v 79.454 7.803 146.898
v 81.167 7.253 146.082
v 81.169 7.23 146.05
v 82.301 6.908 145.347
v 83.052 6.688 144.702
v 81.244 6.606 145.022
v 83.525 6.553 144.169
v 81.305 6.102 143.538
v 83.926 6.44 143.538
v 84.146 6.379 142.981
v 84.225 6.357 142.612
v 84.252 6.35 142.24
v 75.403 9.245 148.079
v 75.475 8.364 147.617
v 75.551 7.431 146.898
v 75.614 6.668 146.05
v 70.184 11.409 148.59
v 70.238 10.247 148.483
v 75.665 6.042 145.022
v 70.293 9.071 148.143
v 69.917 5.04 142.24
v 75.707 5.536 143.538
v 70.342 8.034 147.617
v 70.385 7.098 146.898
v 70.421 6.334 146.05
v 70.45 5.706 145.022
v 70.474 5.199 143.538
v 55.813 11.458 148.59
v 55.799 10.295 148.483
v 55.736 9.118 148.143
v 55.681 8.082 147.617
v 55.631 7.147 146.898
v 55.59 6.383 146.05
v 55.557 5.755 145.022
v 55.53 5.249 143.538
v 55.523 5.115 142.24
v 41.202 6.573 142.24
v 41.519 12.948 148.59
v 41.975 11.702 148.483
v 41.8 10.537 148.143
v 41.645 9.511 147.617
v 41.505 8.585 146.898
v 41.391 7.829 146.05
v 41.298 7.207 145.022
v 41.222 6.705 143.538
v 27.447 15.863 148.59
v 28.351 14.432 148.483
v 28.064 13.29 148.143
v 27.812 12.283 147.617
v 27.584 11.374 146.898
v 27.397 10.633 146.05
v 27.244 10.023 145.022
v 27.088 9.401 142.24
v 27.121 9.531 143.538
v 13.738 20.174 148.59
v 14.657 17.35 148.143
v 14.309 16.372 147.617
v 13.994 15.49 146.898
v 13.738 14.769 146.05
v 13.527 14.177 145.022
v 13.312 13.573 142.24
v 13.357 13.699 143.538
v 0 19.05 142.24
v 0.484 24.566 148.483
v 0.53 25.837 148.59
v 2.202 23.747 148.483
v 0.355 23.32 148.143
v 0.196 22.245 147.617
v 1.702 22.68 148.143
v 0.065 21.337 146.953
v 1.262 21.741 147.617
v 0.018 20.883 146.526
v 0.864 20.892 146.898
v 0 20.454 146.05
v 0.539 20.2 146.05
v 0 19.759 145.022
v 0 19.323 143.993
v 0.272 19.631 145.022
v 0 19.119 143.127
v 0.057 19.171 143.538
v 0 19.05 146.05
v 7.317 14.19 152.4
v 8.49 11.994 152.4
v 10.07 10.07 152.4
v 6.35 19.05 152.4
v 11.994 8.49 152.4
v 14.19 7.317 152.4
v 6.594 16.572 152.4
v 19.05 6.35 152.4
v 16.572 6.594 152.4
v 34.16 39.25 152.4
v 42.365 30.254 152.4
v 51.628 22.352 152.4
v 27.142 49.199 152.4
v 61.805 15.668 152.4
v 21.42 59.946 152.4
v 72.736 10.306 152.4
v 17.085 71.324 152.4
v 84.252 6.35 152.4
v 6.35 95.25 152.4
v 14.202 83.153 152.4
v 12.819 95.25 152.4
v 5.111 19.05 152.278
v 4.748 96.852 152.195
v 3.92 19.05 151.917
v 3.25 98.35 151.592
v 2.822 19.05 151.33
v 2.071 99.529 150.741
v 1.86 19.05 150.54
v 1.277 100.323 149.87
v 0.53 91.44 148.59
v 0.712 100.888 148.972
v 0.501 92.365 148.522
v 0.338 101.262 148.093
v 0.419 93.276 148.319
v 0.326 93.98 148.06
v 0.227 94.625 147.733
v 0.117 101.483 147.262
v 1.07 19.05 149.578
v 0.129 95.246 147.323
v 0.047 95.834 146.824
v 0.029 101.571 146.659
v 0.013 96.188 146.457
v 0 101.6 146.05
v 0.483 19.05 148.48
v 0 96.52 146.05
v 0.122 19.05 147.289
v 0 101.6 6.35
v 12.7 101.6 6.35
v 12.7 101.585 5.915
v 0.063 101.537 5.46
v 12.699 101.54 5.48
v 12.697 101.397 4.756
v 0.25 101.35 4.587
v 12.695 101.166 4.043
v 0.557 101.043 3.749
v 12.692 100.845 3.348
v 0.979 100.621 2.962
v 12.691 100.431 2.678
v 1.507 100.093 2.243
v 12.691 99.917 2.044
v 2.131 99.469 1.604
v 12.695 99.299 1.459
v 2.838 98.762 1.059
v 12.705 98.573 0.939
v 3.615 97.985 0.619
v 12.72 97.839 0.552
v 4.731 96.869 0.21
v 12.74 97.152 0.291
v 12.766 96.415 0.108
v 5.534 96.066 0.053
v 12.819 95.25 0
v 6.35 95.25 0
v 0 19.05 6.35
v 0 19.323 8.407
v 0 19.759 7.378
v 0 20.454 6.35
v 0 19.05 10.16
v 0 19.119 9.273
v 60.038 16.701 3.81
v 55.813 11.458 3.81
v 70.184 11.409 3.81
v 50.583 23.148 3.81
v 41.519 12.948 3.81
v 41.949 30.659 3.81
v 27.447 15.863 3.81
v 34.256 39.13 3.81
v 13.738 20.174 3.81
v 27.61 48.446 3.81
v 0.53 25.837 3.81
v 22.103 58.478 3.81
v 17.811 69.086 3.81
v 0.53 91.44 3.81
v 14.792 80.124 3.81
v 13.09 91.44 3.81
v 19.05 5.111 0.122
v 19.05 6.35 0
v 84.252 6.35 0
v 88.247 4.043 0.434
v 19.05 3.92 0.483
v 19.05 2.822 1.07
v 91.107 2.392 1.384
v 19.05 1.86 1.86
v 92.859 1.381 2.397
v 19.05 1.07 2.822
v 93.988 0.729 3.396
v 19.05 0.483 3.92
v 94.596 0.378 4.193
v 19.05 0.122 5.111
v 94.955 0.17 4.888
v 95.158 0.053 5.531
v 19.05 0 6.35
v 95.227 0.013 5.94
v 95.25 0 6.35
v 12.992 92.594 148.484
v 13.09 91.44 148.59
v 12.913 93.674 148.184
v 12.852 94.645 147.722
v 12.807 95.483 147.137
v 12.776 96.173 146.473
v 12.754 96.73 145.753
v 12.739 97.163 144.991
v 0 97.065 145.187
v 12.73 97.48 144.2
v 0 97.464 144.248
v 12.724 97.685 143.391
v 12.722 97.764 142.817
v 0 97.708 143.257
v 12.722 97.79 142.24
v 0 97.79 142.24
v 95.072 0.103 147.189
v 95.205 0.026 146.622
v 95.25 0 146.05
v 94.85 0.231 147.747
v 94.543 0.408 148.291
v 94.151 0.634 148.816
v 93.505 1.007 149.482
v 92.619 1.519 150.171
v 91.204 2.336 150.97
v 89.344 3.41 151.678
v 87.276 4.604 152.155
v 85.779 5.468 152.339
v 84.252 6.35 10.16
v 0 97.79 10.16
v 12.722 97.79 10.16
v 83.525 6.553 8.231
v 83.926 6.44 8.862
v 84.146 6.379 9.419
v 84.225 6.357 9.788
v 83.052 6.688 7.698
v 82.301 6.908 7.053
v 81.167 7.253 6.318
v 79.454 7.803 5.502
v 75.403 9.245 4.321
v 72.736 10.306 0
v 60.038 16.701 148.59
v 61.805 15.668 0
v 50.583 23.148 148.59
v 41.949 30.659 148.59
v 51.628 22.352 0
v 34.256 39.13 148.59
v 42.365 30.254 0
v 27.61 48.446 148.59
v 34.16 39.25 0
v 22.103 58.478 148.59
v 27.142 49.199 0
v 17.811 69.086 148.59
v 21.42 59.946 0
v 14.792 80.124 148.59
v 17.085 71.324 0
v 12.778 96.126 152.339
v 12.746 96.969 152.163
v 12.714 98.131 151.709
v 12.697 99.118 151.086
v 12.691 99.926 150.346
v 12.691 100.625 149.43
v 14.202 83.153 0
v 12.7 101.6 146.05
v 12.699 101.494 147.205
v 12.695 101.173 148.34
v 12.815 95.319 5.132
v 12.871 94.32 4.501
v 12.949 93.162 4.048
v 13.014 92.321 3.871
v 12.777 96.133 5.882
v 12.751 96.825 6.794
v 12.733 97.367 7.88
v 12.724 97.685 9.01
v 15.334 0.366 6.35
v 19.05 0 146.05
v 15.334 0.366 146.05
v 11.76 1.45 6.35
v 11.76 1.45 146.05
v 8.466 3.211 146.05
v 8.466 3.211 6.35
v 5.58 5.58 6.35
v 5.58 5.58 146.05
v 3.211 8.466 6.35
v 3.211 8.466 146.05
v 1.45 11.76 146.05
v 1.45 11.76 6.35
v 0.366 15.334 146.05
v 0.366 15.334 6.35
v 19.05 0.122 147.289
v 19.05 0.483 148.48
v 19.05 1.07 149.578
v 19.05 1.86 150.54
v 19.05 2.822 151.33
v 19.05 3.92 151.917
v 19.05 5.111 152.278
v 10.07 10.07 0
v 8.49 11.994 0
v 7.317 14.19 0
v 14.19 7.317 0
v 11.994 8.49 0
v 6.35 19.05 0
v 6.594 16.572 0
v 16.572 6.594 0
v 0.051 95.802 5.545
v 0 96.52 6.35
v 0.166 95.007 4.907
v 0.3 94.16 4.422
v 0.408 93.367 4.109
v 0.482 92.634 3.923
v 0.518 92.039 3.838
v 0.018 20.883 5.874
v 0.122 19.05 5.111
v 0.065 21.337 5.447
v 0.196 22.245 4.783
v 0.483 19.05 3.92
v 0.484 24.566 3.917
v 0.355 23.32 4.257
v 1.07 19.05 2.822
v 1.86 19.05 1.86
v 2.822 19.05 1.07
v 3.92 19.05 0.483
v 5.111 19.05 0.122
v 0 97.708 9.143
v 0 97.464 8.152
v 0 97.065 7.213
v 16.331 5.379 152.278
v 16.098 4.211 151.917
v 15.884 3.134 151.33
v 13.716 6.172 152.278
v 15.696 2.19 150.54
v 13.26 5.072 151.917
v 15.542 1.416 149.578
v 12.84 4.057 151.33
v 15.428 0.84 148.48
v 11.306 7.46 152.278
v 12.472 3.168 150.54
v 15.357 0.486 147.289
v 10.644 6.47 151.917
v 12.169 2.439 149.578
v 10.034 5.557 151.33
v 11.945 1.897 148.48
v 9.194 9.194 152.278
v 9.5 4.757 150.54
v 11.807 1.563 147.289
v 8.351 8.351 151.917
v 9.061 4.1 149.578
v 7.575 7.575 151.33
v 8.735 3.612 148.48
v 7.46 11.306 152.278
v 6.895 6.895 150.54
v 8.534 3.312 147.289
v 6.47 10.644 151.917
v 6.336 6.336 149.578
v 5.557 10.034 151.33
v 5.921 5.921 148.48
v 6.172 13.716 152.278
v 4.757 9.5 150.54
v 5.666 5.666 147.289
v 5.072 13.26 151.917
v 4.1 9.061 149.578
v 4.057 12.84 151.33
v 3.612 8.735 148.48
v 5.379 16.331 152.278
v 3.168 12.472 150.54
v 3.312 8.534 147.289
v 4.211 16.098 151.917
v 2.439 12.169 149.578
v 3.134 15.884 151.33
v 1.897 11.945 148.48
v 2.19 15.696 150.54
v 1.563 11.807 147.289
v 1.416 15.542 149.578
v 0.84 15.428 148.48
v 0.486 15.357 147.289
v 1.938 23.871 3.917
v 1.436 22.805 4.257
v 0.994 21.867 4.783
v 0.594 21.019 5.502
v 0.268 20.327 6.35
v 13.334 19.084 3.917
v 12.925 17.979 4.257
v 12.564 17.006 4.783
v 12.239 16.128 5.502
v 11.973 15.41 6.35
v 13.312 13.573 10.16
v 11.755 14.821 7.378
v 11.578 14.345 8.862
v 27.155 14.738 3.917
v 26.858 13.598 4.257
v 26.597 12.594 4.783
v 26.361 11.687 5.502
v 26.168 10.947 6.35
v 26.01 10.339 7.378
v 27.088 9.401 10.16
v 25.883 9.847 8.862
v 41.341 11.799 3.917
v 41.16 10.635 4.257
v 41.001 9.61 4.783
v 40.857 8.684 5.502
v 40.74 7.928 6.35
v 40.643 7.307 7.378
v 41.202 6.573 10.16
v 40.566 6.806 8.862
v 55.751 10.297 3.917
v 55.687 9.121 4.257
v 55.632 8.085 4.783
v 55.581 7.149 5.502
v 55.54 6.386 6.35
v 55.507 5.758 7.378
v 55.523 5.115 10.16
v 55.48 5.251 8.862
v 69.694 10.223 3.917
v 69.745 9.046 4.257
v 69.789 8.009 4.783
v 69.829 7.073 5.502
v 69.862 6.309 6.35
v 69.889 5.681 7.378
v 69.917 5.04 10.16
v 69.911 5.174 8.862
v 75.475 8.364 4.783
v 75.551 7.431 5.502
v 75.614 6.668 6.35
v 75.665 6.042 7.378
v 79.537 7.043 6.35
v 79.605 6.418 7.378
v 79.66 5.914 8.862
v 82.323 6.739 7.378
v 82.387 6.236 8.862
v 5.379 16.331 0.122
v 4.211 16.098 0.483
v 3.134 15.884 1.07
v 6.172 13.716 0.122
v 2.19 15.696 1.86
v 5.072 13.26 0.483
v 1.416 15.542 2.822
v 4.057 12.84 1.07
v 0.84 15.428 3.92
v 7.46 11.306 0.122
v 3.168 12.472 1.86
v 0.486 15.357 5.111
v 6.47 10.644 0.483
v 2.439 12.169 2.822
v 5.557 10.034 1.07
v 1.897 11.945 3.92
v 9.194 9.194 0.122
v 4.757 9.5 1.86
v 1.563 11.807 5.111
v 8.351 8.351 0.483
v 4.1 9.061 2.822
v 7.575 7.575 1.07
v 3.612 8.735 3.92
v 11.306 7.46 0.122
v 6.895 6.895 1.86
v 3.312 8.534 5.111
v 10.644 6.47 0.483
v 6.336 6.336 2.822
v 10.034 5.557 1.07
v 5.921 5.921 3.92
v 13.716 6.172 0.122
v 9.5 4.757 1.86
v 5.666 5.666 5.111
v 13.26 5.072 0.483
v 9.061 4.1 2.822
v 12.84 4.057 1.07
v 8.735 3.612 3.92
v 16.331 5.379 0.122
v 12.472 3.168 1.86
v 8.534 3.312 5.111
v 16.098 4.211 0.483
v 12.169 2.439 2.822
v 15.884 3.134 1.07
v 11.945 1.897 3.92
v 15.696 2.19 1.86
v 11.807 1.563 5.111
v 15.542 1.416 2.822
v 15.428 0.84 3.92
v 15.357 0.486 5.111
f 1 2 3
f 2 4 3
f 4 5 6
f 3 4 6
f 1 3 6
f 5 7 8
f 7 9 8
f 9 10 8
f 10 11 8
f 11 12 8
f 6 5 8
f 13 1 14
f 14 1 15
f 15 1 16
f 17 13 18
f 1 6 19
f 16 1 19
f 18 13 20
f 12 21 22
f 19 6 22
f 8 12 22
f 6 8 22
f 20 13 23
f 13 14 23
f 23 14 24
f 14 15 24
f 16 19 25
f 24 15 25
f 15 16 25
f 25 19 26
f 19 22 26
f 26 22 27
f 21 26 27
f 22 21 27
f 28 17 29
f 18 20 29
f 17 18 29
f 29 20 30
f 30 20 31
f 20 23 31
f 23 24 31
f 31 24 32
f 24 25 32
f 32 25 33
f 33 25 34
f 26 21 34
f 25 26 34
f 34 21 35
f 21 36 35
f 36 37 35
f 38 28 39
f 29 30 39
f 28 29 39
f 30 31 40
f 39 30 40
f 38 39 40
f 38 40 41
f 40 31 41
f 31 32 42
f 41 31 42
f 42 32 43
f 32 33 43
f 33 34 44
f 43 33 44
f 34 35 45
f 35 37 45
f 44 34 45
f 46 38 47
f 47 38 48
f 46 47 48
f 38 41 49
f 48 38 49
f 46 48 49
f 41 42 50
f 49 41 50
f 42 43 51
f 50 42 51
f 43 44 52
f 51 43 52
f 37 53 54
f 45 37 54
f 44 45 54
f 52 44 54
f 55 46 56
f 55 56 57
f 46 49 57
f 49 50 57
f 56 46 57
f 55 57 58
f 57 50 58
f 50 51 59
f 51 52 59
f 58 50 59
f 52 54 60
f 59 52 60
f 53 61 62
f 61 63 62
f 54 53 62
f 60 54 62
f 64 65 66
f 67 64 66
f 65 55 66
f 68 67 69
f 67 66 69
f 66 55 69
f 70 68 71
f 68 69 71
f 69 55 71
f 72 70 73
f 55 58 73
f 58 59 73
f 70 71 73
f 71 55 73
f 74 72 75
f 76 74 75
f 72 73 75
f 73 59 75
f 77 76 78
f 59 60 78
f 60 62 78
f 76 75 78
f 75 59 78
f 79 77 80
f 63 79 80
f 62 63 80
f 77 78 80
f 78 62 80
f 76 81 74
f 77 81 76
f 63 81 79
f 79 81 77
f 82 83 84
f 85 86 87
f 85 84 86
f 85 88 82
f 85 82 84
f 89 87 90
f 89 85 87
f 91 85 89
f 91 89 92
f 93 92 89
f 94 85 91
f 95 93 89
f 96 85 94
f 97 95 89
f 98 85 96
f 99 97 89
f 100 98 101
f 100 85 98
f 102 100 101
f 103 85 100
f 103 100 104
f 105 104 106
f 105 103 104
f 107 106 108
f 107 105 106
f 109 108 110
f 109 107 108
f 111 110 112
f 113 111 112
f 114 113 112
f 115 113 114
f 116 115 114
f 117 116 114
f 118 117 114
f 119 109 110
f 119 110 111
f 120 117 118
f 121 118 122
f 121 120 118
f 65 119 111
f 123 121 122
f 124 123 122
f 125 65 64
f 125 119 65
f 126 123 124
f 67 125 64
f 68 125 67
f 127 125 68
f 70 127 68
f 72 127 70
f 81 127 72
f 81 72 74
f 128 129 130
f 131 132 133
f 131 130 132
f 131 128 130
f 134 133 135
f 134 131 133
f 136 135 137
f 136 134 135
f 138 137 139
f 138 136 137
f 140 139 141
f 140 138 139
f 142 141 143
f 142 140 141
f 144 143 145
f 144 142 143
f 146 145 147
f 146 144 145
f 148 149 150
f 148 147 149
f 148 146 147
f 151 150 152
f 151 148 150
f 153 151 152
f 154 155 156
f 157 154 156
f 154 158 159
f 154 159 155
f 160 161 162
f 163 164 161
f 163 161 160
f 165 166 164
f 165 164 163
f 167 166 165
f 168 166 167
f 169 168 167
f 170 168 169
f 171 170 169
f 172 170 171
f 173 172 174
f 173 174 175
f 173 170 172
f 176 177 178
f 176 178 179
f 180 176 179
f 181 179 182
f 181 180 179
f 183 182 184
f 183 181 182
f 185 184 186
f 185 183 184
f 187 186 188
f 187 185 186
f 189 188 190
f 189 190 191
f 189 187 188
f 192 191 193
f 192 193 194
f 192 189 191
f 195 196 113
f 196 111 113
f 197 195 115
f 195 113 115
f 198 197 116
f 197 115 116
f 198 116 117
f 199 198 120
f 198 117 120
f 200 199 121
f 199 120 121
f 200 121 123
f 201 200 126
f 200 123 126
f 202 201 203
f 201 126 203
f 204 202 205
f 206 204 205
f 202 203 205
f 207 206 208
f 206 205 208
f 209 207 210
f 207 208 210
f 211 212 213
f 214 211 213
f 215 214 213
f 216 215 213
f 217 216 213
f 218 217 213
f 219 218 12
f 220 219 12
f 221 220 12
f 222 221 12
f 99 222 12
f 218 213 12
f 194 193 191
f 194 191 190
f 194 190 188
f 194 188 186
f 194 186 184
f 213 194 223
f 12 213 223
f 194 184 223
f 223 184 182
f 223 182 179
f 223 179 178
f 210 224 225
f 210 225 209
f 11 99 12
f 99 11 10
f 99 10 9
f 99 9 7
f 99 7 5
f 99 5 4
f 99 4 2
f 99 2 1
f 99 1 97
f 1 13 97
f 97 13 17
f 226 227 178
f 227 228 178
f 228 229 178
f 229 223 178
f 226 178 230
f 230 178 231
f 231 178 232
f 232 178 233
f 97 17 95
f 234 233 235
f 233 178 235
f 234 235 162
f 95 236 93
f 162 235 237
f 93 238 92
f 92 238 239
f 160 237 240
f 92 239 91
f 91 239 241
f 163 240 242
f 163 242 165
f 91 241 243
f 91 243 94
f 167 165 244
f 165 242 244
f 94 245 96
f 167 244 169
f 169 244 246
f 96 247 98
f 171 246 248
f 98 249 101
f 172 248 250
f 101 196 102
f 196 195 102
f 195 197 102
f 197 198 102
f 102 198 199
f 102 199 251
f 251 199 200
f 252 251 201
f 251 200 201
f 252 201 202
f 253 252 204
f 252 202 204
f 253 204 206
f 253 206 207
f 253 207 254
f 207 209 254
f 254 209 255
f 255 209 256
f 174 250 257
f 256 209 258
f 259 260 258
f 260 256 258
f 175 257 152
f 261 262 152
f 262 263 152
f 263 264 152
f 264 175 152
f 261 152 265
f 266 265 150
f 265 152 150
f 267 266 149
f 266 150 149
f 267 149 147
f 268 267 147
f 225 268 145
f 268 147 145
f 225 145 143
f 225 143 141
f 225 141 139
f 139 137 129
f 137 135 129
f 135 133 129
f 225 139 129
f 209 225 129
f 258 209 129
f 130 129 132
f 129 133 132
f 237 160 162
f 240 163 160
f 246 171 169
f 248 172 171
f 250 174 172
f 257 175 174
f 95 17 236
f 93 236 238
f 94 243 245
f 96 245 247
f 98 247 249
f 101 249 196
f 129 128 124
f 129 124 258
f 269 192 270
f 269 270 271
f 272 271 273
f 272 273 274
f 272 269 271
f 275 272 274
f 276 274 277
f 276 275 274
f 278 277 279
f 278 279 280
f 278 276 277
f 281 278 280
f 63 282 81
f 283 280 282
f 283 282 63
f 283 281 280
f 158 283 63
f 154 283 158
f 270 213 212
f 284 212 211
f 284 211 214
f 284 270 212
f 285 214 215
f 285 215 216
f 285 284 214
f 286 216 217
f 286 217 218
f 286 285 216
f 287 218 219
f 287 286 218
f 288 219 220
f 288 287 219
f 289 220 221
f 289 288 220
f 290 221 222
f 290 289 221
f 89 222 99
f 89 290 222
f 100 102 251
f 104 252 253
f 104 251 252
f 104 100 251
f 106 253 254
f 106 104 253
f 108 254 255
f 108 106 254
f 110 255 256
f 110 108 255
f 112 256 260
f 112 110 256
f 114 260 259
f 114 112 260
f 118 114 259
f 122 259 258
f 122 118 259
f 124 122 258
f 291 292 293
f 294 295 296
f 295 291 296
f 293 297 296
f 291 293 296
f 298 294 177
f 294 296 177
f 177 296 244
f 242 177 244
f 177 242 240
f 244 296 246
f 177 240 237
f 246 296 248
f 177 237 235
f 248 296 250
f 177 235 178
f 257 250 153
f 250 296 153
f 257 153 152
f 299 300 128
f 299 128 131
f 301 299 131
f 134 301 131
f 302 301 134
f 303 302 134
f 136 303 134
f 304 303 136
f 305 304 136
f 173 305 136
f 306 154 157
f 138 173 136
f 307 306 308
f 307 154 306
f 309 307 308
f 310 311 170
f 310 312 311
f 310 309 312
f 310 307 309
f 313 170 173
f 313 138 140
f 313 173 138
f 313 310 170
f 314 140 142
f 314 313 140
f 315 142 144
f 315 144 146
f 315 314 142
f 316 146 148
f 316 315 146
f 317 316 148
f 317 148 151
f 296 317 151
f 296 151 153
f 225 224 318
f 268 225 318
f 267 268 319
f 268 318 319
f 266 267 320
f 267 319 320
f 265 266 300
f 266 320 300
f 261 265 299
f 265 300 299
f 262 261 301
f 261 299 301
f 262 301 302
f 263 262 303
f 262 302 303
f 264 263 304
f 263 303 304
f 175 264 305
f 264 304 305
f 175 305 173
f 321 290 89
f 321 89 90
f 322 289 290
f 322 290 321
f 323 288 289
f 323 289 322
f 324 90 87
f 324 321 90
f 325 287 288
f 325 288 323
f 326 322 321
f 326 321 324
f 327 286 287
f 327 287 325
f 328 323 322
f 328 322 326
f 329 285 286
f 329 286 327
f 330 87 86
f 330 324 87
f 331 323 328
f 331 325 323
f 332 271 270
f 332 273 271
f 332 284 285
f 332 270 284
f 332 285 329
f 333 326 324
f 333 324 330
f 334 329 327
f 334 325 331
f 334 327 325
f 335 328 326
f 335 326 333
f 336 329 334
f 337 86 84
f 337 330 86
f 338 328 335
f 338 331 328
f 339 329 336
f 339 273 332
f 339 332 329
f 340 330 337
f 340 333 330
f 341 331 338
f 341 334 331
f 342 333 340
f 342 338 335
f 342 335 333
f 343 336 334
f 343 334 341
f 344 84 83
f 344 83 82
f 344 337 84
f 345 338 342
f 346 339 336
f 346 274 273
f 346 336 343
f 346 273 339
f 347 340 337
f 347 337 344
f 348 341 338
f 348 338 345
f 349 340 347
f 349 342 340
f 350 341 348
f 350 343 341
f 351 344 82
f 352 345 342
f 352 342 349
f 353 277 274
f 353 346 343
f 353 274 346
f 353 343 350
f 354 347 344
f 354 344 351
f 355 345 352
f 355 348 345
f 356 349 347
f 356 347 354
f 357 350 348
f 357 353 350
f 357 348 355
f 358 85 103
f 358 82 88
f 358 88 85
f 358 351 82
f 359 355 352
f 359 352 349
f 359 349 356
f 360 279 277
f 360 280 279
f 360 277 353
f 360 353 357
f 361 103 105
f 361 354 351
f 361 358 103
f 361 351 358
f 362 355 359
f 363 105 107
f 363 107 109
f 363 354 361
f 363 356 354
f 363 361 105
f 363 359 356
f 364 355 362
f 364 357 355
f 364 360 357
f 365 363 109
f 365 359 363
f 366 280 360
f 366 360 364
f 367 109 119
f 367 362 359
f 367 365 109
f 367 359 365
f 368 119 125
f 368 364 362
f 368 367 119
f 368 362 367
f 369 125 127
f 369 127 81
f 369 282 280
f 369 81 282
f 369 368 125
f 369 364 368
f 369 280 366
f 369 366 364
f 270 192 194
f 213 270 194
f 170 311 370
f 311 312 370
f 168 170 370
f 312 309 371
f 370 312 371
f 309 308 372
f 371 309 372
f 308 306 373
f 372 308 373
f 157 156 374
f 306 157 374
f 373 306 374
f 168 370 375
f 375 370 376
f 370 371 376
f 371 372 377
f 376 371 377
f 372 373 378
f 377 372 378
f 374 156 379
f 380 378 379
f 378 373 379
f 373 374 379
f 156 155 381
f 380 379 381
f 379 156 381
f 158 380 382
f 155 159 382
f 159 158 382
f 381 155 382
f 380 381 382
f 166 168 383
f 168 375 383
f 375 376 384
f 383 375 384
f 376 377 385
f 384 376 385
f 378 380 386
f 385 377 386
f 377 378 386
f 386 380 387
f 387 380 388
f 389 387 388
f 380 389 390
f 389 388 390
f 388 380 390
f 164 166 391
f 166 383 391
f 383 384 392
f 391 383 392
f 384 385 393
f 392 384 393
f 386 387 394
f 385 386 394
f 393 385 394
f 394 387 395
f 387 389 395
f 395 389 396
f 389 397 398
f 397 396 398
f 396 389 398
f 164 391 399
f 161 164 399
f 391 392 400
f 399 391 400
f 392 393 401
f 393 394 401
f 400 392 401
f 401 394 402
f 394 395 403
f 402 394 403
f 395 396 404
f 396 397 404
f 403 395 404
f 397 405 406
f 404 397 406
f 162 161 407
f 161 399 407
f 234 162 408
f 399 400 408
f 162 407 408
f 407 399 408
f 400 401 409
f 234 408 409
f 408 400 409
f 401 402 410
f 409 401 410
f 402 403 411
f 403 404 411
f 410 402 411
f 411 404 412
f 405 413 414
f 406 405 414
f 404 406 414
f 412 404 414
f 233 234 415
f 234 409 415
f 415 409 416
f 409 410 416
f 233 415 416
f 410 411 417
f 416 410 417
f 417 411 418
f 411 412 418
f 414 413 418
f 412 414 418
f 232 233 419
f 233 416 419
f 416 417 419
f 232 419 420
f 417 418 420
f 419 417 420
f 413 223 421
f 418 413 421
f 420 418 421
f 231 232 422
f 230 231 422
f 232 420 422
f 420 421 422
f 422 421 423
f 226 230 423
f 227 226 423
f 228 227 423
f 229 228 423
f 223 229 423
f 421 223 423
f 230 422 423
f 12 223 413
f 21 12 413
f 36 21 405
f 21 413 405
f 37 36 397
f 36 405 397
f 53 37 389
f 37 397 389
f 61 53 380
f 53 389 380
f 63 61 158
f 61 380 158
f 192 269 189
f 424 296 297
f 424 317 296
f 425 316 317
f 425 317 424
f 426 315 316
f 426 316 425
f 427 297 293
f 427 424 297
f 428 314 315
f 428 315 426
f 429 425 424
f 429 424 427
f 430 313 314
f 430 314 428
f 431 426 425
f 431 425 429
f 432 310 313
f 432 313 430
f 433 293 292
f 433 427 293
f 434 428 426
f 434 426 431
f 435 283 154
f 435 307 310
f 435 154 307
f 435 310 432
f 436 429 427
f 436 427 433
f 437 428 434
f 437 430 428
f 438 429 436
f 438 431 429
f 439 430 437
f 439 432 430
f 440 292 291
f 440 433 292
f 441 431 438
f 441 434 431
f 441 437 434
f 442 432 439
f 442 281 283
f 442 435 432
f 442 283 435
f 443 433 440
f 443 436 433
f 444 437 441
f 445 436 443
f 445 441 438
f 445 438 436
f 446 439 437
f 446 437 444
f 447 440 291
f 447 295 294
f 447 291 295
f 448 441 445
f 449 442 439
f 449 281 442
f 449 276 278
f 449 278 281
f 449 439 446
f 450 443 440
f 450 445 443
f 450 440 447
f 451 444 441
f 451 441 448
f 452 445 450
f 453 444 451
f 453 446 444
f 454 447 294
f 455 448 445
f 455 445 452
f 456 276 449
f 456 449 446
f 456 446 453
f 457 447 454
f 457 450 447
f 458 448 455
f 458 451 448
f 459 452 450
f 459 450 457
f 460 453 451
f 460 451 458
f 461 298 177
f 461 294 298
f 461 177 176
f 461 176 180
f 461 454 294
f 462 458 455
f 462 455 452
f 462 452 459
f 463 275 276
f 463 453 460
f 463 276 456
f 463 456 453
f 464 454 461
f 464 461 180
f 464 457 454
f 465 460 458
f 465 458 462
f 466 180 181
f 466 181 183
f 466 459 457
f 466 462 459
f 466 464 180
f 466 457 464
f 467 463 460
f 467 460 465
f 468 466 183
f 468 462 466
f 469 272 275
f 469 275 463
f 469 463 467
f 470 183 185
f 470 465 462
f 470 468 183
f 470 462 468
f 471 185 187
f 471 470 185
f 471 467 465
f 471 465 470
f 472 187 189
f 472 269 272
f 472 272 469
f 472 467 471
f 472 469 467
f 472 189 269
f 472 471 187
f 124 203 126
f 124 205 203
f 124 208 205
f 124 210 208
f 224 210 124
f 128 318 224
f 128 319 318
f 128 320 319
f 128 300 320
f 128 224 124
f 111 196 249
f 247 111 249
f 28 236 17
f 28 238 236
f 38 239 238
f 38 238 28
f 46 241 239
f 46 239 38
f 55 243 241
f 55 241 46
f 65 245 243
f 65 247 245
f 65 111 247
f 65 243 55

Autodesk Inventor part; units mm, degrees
ref_plane "YZ Plane" through (0, 0, 0) normal (1, 0, 0) x (0, 1, 0)
ref_plane "XZ Plane" through (0, 0, 0) normal (0, 1, 0) x (-1, 0, 0)
ref_plane "XY Plane" through (0, 0, 0) normal (0, 0, 1) x (1, 0, 0)
sketch "Sketch1" plane through (0, 0, 0) normal (0, 0, 1) x (1, 0, 0)
  line L0 (0, 0) -> (0, 101.6)
  line L1 (0, 0) -> (95.25, 0)
  line L2 (95.25, 0) -> (84.2515, 6.35)
  line L3 (95.25, 0) -> (107.95, 0) construction
  line L4 (0, 101.6) -> (12.7, 101.6)
  arc A0 (12.7, 101.6) -> (84.2515, 6.35) centre (110.0717, 100.2457) ccw
  dimension "d0" = 101.6
  dimension "d14" = 12.7
  dimension "d15" = 150
  dimension "d16" = 12.7
  dimension "d28" = 95.25
  dimension "d48" = 97.3812
extrude "Extrusion5" add sketch "Sketch1" along normal blind 152.4
sketch "Sketch5" plane through (0, 0, 0) normal (-1, 0, 0) x (0, 0, 1)
  line L0 (3.81, 97.79) -> (148.59, 97.79)
  line L1 (148.59, 97.79) -> (148.59, 3.175)
  line L2 (148.59, 3.175) -> (3.81, 3.175)
  line L3 (3.81, 3.175) -> (3.81, 97.79)
  line L4 (0, 101.6) -> (152.4, 101.6) projected
  line L5 (0, 0) -> (0, 101.6) projected
  line L6 (0, 0) -> (152.4, 0) projected
  line L7 (152.4, 101.6) -> (152.4, 0) projected
  dimension "d37" = 3.81
  dimension "d38" = 3.81
  dimension "d39" = 3.175
  dimension "d40" = 3.81
extrude "Extrusion6" cut sketch "Sketch5" against normal blind 101.6 contours L0 L1 L2 L3
fillet "Fillet3" radius 19.05 1 edges at (0, 0, 76.2)
sketch "Sketch6" plane through (0, 97.79, 3.81) normal (0, 0, 1) x (1, 0, 0)
  arc A0 (0, -78.74) -> (19.05, -97.79) centre (19.05, -78.74) ccw projected
  arc A1 (12.7, 3.81) -> (84.2515, -91.44) centre (77.4018, 0.6973) ccw projected
  arc A2 (0, -78.74) -> (84.2515, -91.44) centre (63.4925, 56.6564) ccw
  arc A3 (0, -78.74) -> (19.05, -97.79) centre (19.05, -78.74) ccw
  line L0 (95.25, -97.79) -> (19.05, -97.79) projected
  line L1 (84.2515, -91.44) -> (95.25, -97.79) projected
  line L2 (19.05, -97.79) -> (95.25, -97.79)
  line L3 (95.25, -97.79) -> (84.2515, -91.44)
  point P0 (0, -97.79)
  dimension "d44" = 149.5443
extrude "Extrusion7" add sketch "Sketch6" along normal up to next
fillet "Fillet4" radius 6.35 12 edges at (41.2021, 6.5727, 148.59) (41.2021, 6.5727, 3.81) (6.3608, 97.79, 148.59) (6.35, 101.6, 152.4) (6.35, 101.6, 0) (6.3608, 97.79, 3.81) (5.5796, 5.5796, 152.4) (0, 60.325, 152.4) (57.15, 0, 152.4) (5.5796, 5.5796, 0) (0, 60.325, 0) (57.15, 0, 0)
sketch "Sketch7" plane through (0, 0, 152.4) normal (0, 0, 1) x (1, 0, 0)
  arc A0 (12.8188, 95.25) -> (84.2515, 6.35) centre (110.0717, 100.2457) ccw projected
  line L0 (12.7, 101.6) -> (0, 101.6) projected
  line L1 (12.7, 101.6) -> (72.04, 101.6)
  arc A1 (13.0895, 91.44) -> (70.1837, 11.4086) centre (110.0717, 100.2457) ccw projected
  arc A2 (12.7, 101.6) -> (24.1017, 54.5046) centre (110.0717, 100.2457) ccw
  line L2 (43.3863, 54.5046) -> (24.1017, 54.5046)
  arc A3 (43.3863, 54.5046) -> (72.04, 101.6) centre (0.6549, 112.7676) ccw
  point P0 (0, 0)
properties part number "Plow"
